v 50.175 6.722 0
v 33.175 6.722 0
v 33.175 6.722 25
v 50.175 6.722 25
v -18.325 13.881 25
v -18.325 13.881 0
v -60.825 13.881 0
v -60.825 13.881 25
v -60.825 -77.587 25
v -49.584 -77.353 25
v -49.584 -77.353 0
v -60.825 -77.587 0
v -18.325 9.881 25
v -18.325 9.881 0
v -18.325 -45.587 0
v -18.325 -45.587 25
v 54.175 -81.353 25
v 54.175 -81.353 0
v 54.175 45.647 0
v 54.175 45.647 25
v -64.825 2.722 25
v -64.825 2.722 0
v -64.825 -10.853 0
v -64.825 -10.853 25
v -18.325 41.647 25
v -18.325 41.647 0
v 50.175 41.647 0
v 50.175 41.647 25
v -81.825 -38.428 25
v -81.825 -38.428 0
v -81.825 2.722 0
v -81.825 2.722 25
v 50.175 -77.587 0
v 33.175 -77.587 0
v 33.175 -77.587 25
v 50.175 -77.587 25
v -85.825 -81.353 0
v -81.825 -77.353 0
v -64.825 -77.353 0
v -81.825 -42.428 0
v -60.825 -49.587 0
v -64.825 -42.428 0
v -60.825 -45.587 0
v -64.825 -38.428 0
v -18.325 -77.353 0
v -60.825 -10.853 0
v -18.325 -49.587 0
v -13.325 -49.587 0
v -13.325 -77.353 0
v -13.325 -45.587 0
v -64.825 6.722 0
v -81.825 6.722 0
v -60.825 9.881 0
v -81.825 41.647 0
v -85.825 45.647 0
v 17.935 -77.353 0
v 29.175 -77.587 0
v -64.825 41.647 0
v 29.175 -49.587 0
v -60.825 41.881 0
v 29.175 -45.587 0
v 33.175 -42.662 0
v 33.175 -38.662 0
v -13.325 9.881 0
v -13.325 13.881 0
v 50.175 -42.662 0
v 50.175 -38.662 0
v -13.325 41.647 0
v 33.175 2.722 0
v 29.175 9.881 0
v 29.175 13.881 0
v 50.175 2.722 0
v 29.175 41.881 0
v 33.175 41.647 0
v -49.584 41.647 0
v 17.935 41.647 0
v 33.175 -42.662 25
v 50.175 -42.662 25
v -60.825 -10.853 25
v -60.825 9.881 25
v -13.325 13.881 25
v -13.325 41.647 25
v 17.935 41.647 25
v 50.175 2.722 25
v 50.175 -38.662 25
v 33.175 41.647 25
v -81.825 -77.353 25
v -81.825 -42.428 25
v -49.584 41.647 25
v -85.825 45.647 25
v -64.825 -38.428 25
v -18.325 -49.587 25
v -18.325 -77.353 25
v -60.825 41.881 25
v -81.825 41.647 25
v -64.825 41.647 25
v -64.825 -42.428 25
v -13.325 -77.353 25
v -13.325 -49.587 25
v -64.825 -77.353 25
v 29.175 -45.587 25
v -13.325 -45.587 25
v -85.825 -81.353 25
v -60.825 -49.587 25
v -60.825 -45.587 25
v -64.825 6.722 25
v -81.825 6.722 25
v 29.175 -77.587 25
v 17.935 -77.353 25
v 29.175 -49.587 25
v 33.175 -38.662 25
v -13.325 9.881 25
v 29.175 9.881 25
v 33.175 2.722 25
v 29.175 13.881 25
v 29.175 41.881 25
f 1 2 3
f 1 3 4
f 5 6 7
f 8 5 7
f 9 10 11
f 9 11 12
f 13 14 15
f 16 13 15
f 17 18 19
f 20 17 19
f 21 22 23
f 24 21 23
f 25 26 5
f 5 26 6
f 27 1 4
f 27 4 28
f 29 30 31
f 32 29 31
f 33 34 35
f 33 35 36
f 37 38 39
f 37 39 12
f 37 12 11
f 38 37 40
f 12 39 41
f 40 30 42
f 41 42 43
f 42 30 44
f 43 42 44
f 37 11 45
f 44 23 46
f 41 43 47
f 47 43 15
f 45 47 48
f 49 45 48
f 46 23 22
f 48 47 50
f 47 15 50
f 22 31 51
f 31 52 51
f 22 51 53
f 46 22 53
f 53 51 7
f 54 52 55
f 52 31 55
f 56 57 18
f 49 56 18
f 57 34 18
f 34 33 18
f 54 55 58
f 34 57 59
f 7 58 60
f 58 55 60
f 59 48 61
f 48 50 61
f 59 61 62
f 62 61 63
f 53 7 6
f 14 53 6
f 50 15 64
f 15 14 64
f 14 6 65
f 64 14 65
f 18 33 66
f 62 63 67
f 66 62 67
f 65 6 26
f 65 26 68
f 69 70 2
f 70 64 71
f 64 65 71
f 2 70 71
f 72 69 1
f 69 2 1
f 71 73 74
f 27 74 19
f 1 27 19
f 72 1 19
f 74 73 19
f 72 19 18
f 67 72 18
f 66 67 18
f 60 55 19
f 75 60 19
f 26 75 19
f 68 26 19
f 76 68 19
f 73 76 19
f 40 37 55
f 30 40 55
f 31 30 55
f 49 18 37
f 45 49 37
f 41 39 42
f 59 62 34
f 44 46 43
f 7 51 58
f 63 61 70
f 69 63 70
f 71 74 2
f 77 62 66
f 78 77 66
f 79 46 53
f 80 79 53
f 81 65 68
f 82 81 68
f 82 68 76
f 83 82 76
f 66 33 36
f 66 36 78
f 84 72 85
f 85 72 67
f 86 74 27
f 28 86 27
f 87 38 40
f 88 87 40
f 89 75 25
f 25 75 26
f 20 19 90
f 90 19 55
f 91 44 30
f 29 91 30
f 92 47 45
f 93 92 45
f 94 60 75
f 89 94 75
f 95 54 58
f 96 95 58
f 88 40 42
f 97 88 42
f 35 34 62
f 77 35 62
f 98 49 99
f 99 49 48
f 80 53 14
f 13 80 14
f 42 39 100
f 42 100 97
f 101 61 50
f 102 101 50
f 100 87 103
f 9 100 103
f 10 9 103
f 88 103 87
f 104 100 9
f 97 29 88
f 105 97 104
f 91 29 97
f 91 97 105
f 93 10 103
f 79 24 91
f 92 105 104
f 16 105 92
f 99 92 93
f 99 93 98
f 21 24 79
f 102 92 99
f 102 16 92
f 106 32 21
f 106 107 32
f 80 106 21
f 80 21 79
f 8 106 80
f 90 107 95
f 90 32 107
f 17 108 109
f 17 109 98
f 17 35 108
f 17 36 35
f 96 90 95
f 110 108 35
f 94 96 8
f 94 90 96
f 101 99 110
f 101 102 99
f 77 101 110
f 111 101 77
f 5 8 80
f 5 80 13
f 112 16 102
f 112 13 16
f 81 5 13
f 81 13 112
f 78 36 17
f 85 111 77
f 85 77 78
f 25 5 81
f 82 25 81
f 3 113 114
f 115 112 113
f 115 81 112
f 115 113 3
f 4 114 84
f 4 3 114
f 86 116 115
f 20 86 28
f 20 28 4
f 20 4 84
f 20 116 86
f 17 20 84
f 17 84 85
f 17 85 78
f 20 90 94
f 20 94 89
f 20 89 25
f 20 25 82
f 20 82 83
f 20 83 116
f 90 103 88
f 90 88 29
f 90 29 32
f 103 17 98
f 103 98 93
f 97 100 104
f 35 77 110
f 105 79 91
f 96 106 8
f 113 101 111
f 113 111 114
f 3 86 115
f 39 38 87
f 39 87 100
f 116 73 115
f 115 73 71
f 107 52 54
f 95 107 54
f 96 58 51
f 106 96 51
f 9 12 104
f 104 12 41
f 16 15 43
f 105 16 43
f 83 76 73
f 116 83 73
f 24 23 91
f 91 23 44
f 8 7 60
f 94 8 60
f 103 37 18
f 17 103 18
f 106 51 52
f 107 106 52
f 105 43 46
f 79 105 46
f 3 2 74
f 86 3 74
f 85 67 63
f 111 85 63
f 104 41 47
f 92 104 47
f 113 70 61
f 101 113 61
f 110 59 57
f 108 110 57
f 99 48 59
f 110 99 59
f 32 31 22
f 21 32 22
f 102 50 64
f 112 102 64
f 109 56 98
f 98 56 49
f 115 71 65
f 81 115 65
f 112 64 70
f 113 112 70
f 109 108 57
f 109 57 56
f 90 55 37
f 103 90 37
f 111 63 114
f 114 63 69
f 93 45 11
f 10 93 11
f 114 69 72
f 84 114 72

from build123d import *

# Parameters (mm, degrees)
F0_W     = 17.000006
F0_H     = 34.925
F0_W_2   = 17
F1_DEPTH = 25


with BuildPart() as f1:
    # F0 (on Top) → F1 (new body)
    with BuildSketch(Plane.XY):
        Polygon((54.175042, -81.352925), (54.175042, 45.647371), (-85.824958, 45.647357), (-85.824958, -81.352925), align=None)
        with Locations((-73.324955, -59.890378)):
            Rectangle(F0_W, F0_H, mode=Mode.SUBTRACT)
        Polygon((-49.584462, -77.352878), (-60.824958, -77.586921), (-60.824958, -49.586921), (-18.324958, -49.586921), (-18.324958, -61.310325), (-18.324958, -77.352878), align=None, mode=Mode.SUBTRACT)
        Polygon((29.175042, -49.586921), (29.175042, -77.586921), (17.934547, -77.352878), (-13.324958, -77.352878), (-13.324958, -61.310325), (-13.324958, -49.586921), align=None, mode=Mode.SUBTRACT)
        with Locations((41.675042, -60.124421)):
            Rectangle(F0_W_2, F0_H, mode=Mode.SUBTRACT)
        Polygon((29.175042, 9.881367), (29.175042, -10.852675), (29.175042, -24.852878), (29.175042, -45.586921), (-13.324958, -45.586921), (-13.324958, -19.852878), (-13.324958, -15.852675), (-13.324958, 9.881367), align=None, mode=Mode.SUBTRACT)
        Polygon((50.175042, 2.722325), (50.175042, -10.852675), (50.175042, -24.852878), (50.175042, -38.661921), (33.175042, -38.661921), (33.175042, -24.852878), (33.175042, -10.852675), (33.175042, 2.722325), align=None, mode=Mode.SUBTRACT)
        Polygon((-64.824954, 2.722325), (-64.824952, -10.852675), (-64.824952, -24.852878), (-64.824952, -38.427878), (-81.824958, -38.427878), (-81.824958, -24.852878), (-81.824958, -10.852675), (-81.824958, 2.722325), align=None, mode=Mode.SUBTRACT)
        Polygon((-18.324958, 9.881367), (-18.324958, -15.852675), (-18.324958, -19.852878), (-18.324958, -45.586921), (-60.824958, -45.586921), (-60.824958, -24.852878), (-60.824958, -10.852675), (-60.824954, 9.881367), align=None, mode=Mode.SUBTRACT)
        Polygon((-81.824958, 6.722325), (-81.824958, 41.647325), (-64.824957, 41.647325), (-64.824954, 6.722325), align=None, mode=Mode.SUBTRACT)
        Polygon((-60.824955, 13.881367), (-60.824958, 41.881367), (-49.584462, 41.647325), (-18.324958, 41.647325), (-18.324958, 25.604771), (-18.324958, 13.881367), align=None, mode=Mode.SUBTRACT)
        Polygon((17.934547, 41.647325), (29.175042, 41.881367), (29.175042, 13.881367), (-13.324958, 13.881367), (-13.324958, 25.604771), (-13.324958, 41.647325), align=None, mode=Mode.SUBTRACT)
        with Locations((41.675042, 24.184825)):
            Rectangle(F0_W_2, F0_H, mode=Mode.SUBTRACT)
    extrude(amount=F1_DEPTH)


solid = f1.part
